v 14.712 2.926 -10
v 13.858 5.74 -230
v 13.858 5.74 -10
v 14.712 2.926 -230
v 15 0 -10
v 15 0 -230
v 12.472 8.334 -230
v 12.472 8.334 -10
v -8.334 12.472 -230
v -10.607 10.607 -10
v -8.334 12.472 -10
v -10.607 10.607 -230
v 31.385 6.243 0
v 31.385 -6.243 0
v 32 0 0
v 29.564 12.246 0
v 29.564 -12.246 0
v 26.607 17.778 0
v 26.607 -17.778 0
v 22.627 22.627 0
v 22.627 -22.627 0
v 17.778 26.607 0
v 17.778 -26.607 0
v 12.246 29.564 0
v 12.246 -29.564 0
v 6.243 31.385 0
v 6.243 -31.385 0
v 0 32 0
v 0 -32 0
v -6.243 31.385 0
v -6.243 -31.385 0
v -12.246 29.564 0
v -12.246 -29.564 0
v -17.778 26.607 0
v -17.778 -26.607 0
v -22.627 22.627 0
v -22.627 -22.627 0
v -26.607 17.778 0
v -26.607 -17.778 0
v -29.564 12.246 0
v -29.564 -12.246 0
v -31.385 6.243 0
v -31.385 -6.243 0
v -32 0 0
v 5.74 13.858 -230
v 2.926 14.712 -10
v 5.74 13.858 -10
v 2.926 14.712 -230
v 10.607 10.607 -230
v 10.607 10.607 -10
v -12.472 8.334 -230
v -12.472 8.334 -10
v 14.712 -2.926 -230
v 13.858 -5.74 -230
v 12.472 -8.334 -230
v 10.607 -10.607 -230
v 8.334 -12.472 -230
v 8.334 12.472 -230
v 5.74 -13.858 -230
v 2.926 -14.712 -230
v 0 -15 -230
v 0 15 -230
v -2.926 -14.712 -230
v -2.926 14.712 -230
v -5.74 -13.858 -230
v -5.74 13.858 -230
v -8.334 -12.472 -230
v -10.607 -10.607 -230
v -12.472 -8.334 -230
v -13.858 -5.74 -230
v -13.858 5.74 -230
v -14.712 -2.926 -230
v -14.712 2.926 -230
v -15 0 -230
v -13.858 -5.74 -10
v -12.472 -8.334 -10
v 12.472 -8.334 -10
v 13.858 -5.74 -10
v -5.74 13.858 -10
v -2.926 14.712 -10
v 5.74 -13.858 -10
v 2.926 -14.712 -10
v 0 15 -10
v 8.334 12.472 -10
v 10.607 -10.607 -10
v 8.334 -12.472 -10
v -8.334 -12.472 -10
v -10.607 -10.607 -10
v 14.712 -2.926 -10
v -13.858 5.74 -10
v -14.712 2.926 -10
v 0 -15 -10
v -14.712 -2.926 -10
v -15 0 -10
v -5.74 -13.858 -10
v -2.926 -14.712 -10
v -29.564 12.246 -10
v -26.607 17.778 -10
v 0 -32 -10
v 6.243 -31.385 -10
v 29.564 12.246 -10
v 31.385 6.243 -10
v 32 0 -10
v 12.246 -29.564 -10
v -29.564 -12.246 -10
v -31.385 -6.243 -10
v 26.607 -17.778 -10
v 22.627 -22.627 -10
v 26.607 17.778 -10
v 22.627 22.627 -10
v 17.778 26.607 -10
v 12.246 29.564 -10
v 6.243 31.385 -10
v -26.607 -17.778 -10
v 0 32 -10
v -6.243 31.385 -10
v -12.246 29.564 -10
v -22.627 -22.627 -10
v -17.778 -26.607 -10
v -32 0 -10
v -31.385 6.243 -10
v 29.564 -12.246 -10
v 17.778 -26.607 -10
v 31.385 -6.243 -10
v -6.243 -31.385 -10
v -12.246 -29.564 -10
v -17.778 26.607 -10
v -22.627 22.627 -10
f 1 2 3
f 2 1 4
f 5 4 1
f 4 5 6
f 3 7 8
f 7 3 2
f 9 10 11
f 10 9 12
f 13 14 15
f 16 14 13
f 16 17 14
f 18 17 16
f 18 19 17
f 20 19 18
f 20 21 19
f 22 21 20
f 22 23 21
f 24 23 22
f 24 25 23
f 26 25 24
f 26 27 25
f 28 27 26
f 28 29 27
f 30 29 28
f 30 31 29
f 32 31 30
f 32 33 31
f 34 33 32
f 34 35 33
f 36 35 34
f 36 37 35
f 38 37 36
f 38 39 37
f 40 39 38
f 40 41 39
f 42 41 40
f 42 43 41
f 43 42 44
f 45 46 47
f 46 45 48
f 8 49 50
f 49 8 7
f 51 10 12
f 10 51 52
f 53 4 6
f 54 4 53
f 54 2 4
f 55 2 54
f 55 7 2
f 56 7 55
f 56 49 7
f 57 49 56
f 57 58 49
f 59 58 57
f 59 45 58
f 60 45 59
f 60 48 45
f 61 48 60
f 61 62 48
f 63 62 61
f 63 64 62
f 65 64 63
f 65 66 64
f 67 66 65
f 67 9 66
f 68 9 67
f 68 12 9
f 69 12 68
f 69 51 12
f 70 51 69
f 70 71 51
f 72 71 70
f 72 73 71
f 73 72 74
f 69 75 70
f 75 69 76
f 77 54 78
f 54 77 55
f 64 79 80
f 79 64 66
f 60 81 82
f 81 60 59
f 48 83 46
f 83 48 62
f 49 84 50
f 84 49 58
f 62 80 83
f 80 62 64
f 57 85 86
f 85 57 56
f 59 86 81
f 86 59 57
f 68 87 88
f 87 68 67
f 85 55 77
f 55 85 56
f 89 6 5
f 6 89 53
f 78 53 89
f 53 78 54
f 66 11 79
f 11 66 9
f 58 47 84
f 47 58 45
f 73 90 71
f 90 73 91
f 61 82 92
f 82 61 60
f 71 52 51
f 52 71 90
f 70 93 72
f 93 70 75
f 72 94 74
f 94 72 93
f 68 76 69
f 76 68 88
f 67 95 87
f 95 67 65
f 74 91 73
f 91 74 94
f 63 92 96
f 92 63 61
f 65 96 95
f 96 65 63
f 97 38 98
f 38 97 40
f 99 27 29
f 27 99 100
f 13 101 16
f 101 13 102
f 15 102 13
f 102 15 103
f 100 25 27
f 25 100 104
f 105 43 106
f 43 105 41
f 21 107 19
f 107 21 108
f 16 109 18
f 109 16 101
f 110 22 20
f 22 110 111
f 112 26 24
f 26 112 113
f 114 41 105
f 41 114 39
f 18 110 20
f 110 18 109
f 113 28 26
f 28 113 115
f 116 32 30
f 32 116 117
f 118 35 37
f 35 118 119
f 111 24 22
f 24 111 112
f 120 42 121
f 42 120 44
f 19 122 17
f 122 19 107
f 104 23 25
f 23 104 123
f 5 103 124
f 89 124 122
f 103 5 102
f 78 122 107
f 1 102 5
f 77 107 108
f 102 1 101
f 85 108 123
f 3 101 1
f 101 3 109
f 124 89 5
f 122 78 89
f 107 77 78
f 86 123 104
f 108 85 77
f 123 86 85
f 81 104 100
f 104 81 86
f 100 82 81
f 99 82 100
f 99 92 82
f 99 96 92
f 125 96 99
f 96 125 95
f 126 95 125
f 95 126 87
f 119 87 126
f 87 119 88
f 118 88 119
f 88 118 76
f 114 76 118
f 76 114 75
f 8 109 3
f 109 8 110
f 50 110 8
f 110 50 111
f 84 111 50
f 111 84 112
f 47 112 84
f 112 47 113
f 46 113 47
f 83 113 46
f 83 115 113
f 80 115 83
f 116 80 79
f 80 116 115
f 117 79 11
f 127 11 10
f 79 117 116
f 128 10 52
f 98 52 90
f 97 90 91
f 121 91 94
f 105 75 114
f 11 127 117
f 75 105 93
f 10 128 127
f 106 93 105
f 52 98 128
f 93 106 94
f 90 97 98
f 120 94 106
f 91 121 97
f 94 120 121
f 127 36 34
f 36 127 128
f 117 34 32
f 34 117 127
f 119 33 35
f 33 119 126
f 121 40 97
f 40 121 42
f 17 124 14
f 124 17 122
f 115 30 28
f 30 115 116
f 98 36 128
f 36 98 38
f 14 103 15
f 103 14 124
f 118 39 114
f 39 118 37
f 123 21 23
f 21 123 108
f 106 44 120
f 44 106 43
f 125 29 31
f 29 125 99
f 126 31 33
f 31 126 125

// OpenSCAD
// ============================================================================
// FILE: export_lift_ram.scad
// OUTPUT: lift_ram_visual.stl
// PURPOSE: Export only the moving central silver actuator ram.
// ============================================================================

use <main.scad>


// ============================================================================
// RENDER SETTINGS
// ============================================================================

eps = 0.05;

quality = "render";

preview_fn = 32;
render_fn  = 72;

$fn = quality == "render"
    ? render_fn
    : preview_fn;


// ============================================================================
// MOVING RAM EXPORT
// ============================================================================

lift_actuator_moving_ram_urdf();
